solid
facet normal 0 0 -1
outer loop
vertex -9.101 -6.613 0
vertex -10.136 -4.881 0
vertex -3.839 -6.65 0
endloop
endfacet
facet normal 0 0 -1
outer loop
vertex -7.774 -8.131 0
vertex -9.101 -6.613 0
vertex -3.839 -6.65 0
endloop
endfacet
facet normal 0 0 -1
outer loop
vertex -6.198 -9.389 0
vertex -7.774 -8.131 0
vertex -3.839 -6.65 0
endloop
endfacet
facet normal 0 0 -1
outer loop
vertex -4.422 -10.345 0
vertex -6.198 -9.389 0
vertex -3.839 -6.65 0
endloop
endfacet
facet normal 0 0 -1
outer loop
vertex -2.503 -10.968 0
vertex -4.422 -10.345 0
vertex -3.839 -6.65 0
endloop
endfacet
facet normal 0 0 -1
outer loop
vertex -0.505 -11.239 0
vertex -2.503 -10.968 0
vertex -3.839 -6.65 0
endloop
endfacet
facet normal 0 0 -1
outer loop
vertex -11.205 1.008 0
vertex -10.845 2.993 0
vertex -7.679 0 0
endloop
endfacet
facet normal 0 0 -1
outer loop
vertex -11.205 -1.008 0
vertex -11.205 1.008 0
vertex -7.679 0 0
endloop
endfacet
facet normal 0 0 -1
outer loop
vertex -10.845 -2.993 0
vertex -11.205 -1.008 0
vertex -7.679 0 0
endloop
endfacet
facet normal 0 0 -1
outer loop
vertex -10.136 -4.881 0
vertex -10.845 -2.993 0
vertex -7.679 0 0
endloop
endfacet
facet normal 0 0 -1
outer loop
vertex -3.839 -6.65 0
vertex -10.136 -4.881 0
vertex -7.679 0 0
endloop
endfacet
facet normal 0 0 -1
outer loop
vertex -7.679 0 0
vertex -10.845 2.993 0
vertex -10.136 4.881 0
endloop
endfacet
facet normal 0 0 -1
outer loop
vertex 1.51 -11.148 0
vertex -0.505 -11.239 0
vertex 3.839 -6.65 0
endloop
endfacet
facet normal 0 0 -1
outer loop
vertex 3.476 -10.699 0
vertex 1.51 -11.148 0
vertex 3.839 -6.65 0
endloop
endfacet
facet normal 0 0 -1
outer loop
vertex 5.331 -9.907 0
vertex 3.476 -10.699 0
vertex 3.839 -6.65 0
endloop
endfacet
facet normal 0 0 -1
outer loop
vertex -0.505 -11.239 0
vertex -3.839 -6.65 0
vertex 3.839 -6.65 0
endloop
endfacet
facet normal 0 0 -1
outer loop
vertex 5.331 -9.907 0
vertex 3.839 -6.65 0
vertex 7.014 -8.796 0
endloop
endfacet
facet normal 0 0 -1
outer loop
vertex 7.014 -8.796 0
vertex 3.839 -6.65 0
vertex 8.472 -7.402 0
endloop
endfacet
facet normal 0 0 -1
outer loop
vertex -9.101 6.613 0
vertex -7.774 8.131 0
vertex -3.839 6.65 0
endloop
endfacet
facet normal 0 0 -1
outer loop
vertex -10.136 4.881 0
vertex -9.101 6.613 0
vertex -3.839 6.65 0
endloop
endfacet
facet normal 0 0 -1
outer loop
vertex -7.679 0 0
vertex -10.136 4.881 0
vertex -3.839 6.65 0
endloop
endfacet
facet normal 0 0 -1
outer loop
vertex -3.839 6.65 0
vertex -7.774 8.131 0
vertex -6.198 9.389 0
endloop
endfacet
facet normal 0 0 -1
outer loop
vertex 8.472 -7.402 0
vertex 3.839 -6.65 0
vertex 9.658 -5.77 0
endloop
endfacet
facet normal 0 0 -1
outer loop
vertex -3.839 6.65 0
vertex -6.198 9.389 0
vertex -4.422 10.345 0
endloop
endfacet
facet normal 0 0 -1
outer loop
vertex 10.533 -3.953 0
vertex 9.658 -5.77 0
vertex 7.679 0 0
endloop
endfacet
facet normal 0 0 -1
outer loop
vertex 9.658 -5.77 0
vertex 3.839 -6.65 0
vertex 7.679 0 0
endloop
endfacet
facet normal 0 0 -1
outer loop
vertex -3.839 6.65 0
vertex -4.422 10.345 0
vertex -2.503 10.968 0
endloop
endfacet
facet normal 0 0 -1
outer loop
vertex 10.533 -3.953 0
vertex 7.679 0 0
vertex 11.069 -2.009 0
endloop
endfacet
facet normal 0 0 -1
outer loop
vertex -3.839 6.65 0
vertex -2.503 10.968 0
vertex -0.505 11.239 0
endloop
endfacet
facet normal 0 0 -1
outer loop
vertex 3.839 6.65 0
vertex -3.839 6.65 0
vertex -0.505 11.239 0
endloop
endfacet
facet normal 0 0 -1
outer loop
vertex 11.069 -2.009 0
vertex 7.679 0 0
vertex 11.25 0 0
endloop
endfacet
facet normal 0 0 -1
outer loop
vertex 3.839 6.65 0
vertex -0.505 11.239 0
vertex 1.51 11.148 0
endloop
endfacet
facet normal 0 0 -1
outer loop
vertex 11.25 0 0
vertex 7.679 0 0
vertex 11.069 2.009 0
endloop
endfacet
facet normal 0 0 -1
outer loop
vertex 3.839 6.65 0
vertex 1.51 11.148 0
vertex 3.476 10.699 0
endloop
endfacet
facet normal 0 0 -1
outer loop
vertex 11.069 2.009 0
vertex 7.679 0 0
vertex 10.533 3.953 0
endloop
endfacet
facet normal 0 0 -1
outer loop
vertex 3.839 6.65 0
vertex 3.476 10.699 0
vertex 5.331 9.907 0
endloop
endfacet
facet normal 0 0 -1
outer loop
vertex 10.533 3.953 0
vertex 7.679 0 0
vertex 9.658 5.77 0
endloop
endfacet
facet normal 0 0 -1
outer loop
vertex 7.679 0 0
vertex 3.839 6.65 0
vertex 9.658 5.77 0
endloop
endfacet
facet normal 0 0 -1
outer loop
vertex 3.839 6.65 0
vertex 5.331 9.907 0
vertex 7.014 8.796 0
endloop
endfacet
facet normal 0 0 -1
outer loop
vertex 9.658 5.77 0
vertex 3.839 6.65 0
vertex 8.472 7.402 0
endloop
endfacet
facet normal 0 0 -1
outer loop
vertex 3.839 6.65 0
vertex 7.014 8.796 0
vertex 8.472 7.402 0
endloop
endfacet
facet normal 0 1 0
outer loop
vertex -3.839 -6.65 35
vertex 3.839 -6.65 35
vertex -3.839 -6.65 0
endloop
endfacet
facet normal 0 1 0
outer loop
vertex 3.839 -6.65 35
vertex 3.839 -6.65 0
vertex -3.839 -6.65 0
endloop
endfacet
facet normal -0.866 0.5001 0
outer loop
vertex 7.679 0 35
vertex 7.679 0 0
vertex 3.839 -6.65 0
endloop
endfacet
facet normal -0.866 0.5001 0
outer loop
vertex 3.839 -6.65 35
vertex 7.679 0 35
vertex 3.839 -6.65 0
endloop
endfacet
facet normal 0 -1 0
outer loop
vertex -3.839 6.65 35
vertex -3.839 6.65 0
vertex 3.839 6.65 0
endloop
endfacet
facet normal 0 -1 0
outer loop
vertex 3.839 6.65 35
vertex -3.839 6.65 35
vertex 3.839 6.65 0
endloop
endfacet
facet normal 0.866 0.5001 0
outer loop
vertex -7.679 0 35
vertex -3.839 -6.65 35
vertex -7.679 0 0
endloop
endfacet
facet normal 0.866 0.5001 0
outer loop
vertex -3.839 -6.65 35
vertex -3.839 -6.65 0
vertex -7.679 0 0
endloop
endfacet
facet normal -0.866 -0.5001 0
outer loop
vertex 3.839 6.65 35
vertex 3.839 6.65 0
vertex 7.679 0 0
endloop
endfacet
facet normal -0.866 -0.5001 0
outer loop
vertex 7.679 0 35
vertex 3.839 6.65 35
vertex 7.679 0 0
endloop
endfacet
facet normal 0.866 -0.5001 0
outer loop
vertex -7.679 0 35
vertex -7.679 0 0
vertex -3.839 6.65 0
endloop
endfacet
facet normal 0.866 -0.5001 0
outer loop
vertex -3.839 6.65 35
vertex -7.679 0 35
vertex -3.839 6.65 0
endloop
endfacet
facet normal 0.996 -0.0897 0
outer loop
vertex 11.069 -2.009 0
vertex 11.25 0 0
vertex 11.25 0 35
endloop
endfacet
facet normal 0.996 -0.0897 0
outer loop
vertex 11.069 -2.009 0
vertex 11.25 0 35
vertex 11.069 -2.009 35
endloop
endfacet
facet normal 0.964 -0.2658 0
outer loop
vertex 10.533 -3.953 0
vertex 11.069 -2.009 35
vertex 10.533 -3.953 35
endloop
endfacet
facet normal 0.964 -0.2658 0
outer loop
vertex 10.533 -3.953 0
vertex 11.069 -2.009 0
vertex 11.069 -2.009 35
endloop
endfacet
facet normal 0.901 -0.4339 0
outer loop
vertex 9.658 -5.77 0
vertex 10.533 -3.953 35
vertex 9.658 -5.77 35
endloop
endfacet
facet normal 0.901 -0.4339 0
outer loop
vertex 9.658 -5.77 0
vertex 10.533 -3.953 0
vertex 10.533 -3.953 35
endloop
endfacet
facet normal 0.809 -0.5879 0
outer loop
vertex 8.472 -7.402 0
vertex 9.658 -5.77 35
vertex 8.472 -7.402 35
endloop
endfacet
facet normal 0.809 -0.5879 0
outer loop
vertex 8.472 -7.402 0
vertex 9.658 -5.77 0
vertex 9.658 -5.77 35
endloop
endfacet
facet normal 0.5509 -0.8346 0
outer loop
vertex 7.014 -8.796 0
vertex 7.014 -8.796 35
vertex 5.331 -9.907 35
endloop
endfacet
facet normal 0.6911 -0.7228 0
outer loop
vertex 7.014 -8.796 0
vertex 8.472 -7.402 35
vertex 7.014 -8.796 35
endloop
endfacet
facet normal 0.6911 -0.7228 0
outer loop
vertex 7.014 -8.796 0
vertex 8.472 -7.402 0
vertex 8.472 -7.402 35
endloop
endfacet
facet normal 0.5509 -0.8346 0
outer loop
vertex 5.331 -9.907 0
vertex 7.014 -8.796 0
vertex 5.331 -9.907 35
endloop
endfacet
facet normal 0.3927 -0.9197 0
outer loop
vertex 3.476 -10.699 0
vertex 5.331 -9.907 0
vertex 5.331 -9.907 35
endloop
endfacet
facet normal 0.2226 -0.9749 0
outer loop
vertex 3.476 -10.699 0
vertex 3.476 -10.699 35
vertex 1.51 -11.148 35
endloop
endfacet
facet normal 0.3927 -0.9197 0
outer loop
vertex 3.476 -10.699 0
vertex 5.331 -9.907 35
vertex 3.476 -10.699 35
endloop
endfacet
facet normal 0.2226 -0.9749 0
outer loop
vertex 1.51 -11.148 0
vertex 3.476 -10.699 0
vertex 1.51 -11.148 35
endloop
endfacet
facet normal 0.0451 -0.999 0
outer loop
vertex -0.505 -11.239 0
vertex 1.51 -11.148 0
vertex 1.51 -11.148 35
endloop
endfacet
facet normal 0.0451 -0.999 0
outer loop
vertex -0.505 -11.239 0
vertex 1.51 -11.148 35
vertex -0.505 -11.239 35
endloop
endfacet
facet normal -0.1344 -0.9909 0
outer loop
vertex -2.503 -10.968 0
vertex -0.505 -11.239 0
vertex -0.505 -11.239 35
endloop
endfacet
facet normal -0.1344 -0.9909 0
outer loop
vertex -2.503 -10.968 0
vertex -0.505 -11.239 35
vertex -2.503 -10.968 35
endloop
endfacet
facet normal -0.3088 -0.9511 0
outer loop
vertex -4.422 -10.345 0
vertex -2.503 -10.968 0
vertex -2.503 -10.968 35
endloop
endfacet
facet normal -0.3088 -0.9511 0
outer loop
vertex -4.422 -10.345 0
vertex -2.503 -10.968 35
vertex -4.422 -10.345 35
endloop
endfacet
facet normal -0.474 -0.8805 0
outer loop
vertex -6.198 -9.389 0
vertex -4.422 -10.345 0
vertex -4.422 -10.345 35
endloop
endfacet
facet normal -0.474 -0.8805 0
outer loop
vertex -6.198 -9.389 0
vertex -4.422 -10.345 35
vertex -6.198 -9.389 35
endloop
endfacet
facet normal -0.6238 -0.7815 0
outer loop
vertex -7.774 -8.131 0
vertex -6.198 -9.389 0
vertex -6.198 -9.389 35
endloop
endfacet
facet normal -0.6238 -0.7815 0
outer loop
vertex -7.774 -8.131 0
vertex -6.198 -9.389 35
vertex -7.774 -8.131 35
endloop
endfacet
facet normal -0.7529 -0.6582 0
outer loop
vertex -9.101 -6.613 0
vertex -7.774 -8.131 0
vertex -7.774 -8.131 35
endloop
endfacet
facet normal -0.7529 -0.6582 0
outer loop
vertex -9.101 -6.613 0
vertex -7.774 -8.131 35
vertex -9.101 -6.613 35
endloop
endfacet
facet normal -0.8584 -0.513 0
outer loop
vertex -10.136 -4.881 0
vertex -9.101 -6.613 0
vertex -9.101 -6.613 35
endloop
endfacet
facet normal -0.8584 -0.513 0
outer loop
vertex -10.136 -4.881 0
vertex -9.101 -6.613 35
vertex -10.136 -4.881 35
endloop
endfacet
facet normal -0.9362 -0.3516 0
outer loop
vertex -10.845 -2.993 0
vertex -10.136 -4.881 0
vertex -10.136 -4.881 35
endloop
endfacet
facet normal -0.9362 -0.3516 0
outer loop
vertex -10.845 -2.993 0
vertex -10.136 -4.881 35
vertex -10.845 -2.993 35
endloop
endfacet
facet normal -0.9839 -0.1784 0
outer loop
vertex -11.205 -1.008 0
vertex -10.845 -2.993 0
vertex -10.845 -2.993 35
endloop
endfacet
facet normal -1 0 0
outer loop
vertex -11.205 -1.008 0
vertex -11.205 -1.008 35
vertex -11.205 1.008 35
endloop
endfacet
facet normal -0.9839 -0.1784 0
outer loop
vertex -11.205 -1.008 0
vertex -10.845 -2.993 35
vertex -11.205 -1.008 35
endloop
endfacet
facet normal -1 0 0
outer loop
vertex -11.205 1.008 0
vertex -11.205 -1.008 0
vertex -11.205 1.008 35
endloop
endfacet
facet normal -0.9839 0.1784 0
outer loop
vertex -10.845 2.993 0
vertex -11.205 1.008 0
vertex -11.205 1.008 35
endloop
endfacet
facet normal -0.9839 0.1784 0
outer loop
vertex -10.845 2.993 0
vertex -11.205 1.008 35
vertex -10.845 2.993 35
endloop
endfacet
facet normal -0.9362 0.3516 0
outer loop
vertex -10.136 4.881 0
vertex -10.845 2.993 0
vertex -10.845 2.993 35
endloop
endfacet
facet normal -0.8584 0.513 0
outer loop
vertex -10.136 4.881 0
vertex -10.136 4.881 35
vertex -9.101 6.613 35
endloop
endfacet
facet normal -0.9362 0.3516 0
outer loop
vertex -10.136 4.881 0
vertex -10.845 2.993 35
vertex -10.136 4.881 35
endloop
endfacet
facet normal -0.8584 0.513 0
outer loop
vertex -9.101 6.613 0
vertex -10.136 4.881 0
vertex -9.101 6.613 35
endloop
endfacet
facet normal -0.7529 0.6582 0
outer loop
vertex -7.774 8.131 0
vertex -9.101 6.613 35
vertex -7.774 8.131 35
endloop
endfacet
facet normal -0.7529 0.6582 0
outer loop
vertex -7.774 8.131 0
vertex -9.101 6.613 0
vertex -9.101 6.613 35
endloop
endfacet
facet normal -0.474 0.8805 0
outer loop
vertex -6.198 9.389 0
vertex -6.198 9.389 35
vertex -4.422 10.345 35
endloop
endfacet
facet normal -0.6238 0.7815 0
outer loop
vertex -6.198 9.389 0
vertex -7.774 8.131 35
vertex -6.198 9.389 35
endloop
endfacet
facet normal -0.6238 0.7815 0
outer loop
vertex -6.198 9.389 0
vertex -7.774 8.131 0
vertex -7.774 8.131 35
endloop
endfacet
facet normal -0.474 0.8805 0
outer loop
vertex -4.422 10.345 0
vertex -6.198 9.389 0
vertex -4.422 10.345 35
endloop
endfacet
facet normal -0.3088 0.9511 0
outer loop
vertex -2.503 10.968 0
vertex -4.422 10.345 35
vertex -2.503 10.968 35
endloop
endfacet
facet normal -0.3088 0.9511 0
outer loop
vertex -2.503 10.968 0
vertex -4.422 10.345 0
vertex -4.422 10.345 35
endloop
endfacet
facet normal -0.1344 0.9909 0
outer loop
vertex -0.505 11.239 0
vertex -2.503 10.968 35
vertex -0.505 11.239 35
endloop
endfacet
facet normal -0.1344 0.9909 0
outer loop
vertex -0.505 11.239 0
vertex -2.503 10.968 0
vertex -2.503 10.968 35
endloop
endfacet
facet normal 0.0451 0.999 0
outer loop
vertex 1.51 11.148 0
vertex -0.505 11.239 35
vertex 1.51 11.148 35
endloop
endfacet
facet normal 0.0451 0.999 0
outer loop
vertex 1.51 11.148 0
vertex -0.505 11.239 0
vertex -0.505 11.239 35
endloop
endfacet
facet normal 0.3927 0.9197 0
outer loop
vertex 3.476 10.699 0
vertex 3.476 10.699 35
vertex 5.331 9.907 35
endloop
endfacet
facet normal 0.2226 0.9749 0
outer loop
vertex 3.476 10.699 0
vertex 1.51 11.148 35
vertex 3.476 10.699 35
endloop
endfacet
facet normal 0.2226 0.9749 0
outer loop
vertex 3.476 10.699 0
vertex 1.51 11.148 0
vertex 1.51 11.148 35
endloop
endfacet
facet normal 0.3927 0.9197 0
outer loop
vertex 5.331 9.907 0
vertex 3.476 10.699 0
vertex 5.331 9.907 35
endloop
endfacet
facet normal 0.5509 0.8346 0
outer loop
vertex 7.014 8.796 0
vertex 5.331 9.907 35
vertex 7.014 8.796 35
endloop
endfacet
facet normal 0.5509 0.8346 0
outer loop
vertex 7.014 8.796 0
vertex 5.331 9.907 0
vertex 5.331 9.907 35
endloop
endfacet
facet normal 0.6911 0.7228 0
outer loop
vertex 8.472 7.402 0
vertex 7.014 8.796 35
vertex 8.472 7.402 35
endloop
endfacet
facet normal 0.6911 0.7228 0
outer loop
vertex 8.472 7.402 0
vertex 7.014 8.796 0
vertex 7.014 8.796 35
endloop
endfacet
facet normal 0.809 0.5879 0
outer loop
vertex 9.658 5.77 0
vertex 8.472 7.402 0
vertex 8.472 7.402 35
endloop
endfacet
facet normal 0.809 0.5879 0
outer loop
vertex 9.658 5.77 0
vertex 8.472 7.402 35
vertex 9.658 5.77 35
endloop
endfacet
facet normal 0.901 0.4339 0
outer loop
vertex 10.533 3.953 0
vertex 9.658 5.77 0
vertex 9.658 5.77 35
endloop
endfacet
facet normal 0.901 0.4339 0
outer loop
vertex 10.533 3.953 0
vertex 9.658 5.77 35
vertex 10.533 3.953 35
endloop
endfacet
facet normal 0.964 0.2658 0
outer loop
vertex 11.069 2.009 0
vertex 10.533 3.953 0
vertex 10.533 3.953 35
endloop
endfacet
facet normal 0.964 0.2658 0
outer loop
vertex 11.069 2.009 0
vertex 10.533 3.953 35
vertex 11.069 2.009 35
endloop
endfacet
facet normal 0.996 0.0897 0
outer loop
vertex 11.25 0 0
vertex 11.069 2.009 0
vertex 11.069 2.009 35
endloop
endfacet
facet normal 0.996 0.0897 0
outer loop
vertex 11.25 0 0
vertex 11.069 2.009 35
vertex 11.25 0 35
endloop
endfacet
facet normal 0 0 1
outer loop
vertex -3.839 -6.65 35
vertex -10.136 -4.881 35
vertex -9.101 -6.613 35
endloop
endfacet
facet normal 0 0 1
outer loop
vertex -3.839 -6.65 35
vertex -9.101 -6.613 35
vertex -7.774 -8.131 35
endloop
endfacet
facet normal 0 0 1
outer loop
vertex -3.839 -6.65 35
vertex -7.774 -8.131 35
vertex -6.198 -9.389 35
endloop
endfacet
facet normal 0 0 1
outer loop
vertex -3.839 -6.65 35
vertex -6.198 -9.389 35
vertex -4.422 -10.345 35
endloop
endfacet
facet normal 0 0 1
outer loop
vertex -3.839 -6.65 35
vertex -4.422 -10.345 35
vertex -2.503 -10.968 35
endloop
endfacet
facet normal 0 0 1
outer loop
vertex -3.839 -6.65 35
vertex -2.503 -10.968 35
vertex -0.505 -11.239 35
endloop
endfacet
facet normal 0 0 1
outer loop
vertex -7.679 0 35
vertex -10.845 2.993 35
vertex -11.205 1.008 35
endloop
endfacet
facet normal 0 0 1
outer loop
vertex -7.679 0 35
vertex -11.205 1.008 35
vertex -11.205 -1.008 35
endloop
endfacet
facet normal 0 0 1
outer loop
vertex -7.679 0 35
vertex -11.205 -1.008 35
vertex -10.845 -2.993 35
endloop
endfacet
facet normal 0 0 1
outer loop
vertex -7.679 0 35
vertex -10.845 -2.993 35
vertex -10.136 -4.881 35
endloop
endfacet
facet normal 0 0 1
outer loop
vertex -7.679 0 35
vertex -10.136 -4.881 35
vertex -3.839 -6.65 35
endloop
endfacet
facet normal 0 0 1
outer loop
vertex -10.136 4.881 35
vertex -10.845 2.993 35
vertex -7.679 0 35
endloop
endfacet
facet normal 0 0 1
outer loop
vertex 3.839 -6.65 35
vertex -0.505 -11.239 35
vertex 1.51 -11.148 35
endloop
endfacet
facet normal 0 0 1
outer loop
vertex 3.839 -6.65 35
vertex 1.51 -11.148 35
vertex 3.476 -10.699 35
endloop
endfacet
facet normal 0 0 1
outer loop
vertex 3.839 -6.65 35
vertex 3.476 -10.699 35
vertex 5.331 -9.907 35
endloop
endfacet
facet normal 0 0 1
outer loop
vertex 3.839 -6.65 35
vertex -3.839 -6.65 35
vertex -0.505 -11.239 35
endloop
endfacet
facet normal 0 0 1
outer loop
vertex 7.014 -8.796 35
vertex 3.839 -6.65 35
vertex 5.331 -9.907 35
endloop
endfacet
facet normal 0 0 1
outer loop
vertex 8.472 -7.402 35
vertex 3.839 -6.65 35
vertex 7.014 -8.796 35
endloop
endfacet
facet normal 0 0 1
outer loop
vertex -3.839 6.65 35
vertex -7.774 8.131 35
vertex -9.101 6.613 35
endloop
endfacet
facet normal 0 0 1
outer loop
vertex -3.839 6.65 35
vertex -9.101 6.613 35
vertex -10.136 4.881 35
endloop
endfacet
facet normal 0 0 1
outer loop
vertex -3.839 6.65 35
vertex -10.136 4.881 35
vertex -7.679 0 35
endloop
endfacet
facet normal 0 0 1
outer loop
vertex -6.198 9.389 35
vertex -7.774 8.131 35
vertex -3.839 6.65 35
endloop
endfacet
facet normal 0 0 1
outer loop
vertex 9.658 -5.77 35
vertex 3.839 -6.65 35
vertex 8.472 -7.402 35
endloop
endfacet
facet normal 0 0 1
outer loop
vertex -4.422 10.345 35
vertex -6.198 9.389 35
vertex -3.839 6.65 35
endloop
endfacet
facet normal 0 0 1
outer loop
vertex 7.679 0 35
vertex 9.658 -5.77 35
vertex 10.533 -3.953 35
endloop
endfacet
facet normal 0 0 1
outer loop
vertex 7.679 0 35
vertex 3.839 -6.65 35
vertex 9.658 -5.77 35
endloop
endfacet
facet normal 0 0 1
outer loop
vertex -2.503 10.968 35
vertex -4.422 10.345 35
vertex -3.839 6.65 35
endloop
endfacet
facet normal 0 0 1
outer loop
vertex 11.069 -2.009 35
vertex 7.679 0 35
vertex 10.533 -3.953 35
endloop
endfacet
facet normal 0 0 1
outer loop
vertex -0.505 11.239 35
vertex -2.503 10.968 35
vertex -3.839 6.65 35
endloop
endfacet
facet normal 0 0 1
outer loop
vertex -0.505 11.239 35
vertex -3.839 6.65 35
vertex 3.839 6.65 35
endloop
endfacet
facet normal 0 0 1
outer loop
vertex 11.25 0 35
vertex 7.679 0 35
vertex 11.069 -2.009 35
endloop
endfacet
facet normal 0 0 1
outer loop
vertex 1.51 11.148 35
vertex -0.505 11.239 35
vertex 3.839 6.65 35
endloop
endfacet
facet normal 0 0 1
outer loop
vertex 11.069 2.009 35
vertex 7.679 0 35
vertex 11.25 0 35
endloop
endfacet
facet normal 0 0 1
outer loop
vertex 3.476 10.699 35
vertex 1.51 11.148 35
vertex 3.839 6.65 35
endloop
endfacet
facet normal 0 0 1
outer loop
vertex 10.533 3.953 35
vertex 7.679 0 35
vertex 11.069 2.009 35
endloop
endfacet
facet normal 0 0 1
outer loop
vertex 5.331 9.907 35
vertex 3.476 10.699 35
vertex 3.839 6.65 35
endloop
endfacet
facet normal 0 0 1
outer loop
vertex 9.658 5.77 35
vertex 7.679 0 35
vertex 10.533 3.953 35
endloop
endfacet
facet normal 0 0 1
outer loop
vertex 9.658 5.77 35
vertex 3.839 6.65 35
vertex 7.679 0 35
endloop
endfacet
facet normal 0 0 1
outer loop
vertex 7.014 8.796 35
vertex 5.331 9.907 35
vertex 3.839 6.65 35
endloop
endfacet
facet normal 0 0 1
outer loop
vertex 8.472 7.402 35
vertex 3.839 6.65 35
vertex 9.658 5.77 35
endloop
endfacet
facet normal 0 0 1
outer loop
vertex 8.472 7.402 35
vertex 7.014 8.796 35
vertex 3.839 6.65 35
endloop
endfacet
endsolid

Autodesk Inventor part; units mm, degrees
ref_plane "YZ Plane" through (0, 0, 0) normal (1, 0, 0) x (0, 1, 0)
ref_plane "XZ Plane" through (0, 0, 0) normal (0, 1, 0) x (-1, 0, 0)
ref_plane "XY Plane" through (0, 0, 0) normal (0, 0, 1) x (1, 0, 0)
sketch "Sketch1" plane through (0, 0, 0) normal (0, 0, 1) x (1, 0, 0)
  circle A0 centre (0, 0) radius 11.25
  dimension "d0" = 22.5
extrude "Extrusion1" add sketch "Sketch1" along normal blind 25
sketch "Sketch2" plane through (0, 0, 0) normal (0, 0, -1) x (-1, 0, 0)
  line L0 (7.6788, 0) -> (3.8394, -6.65)
  line L1 (3.8394, -6.65) -> (-3.8394, -6.65)
  line L2 (-3.8394, -6.65) -> (-7.6788, 0)
  line L3 (-7.6788, 0) -> (-3.8394, 6.65)
  line L4 (-3.8394, 6.65) -> (3.8394, 6.65)
  line L5 (3.8394, 6.65) -> (7.6788, 0)
  point P0 (0, 0)
  point P1 (0, 0)
  dimension "d3" = 13.3
extrude "Extrusion2" cut sketch "Sketch2" against normal blind 30
sketch "Sketch3" plane through (0, 0, 25) normal (0, 0, 1) x (1, 0, 0)
  line L0 (3.8394, 6.65) -> (7.6788, 0) projected
  line L1 (7.6788, 0) -> (3.8394, -6.65) projected
  line L2 (3.8394, -6.65) -> (-3.8394, -6.65) projected
  line L3 (-3.8394, -6.65) -> (-7.6788, 0) projected
  line L4 (-7.6788, 0) -> (-3.8394, 6.65) projected
  line L5 (-3.8394, 6.65) -> (3.8394, 6.65) projected
  circle A0 centre (0, 0) radius 11.25 projected
extrude "Extrusion3" add sketch "Sketch3" along normal blind 10
properties part number "tubo"
